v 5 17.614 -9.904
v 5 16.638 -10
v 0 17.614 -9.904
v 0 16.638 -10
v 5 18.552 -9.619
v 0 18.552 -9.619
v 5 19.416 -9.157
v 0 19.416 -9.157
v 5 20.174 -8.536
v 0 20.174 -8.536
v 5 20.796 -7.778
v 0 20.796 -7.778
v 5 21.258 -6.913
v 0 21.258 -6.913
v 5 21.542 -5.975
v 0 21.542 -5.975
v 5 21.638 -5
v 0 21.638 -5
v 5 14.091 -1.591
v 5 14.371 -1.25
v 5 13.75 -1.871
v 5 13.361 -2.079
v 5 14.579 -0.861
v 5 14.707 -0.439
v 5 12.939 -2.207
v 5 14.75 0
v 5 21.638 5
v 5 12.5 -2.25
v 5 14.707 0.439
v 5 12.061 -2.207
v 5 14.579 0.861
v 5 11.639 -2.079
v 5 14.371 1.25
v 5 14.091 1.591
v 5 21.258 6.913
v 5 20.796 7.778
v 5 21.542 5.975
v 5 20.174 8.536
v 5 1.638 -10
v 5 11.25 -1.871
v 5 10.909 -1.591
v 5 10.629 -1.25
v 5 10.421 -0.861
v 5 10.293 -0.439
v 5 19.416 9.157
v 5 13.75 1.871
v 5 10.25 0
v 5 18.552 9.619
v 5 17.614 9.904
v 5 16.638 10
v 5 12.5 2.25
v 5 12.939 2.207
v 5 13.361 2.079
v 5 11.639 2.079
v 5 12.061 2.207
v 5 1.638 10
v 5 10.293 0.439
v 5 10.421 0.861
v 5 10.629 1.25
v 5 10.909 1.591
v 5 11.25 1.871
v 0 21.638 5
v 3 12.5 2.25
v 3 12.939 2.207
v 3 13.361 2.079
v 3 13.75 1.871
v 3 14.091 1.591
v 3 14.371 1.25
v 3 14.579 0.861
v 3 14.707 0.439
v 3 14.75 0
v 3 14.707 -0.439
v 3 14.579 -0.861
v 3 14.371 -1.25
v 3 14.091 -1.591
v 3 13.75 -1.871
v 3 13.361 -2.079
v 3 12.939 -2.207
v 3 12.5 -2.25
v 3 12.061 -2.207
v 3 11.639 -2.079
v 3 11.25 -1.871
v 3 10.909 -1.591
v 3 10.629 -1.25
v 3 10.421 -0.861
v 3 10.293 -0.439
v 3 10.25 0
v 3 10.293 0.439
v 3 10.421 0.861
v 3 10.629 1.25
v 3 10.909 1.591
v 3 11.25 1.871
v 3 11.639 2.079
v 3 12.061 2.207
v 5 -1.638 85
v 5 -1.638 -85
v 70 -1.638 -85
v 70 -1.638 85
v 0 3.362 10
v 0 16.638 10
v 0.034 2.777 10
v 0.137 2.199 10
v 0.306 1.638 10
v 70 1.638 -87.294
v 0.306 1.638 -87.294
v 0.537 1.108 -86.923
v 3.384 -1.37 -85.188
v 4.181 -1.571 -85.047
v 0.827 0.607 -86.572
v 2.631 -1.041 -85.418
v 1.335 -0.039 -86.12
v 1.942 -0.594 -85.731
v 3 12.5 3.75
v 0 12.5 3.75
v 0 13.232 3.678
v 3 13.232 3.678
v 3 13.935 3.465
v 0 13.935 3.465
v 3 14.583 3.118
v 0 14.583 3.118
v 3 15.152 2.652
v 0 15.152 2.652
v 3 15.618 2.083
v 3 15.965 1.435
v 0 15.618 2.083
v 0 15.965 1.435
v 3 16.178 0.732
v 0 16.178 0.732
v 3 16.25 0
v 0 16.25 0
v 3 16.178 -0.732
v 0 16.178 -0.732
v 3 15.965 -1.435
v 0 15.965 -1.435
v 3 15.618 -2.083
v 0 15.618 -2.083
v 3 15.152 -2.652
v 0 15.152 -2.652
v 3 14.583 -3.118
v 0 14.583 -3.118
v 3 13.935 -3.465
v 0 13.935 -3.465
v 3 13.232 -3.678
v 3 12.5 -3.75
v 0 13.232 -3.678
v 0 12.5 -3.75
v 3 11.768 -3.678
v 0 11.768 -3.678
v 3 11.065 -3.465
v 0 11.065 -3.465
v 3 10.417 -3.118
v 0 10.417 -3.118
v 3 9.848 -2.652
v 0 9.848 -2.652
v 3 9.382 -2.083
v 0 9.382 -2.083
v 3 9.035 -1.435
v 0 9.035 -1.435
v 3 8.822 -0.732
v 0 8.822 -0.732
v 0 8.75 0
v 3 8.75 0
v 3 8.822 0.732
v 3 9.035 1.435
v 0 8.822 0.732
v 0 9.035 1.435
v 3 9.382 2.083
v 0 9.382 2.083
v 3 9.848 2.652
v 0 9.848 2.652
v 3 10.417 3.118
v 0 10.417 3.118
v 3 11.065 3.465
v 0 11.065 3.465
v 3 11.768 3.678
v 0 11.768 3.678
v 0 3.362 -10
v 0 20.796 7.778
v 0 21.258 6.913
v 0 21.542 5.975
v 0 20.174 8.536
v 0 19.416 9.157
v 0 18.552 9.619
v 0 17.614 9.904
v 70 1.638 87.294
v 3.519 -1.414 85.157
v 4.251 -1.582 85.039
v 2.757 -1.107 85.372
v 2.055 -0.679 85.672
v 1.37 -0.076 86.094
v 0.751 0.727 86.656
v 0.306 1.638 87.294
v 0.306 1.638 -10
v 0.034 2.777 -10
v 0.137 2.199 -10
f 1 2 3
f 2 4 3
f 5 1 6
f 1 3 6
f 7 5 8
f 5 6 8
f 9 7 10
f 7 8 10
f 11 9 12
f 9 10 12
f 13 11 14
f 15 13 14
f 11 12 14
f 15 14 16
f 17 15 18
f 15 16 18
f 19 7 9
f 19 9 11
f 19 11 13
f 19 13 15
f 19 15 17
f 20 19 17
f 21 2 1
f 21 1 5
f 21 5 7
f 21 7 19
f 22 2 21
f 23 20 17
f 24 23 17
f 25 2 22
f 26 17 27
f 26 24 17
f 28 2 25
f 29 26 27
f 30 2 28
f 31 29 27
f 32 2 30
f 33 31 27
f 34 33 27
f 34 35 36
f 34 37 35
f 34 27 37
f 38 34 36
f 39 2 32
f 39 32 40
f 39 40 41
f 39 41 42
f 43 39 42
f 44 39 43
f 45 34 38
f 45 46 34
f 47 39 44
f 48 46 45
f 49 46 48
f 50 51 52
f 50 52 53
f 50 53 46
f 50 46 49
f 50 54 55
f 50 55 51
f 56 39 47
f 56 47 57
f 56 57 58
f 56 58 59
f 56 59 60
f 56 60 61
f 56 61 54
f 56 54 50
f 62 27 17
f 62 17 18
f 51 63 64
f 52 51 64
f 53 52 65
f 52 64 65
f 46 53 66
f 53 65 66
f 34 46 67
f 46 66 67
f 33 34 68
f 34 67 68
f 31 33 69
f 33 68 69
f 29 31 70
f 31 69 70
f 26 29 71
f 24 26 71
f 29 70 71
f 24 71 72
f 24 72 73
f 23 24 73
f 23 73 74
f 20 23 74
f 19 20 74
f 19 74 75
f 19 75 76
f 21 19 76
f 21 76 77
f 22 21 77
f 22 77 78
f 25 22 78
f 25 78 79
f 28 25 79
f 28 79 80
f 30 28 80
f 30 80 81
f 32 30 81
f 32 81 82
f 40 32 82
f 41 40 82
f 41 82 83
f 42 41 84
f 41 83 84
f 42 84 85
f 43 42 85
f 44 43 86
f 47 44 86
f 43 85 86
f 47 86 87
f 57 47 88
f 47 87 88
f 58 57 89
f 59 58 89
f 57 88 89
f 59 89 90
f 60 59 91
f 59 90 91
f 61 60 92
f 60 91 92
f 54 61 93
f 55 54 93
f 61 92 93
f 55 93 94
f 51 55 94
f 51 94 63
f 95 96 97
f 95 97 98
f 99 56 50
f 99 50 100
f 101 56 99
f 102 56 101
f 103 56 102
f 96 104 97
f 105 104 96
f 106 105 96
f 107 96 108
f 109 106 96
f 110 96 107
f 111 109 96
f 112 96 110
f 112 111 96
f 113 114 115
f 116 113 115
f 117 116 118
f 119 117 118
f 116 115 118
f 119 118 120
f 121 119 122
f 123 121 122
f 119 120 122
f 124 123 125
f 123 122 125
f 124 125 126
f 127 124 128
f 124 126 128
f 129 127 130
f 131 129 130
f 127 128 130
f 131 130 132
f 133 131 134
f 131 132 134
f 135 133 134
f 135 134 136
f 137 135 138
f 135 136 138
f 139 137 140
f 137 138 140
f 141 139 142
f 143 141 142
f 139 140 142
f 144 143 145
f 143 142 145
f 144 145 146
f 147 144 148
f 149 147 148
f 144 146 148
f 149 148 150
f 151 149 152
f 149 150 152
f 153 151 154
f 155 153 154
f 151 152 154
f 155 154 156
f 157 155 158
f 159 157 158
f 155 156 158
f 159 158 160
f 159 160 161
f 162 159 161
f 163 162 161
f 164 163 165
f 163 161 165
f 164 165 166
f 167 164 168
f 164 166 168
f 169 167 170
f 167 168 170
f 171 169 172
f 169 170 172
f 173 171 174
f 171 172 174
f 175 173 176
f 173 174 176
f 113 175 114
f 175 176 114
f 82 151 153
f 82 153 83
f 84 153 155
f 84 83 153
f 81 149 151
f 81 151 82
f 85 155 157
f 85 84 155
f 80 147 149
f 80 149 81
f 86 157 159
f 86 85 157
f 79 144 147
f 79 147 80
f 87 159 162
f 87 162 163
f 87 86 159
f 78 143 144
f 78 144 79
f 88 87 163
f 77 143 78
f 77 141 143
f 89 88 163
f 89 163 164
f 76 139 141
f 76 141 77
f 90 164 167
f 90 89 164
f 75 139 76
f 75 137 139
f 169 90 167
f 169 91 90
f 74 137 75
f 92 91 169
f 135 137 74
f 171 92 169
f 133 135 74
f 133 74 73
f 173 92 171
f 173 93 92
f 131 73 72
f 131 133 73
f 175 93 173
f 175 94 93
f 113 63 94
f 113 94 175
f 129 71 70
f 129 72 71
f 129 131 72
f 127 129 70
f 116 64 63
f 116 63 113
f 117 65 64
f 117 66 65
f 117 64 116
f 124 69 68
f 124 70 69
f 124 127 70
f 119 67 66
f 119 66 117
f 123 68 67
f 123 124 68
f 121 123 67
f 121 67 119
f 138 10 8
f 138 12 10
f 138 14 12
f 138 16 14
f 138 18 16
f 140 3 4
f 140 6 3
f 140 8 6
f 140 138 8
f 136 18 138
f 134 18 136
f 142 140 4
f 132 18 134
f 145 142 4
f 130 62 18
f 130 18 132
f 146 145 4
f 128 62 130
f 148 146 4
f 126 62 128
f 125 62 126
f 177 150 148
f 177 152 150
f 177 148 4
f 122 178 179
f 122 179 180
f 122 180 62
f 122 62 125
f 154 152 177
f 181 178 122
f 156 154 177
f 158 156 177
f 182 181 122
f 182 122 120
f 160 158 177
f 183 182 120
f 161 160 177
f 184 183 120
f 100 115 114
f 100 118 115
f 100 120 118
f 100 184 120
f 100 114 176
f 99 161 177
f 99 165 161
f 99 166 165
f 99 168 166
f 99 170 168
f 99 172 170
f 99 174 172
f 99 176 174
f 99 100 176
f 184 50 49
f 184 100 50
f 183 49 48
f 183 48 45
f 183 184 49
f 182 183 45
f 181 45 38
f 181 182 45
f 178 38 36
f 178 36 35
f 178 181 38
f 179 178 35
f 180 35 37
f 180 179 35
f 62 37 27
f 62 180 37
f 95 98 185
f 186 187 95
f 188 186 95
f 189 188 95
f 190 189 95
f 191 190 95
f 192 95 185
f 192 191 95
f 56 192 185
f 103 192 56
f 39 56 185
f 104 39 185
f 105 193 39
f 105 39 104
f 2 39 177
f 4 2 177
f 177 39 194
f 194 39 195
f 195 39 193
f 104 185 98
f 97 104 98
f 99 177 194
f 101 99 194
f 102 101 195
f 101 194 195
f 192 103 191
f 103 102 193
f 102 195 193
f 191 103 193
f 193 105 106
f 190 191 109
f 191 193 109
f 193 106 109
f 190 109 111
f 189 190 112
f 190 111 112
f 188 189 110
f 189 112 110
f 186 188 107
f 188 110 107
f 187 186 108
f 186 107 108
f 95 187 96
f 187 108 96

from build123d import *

# Parameters (mm, degrees)
BOSS_EXTRUDE1_DEPTH     = 70
SKETCH4_W               = 5
SKETCH4_H               = 20
BOSS_EXTRUDE2_DEPTH     = 20
CUT_EXTRUDE2_DEPTH      = 114.967153248
CUT_EXTRUDE2_DEPTH_BACK = 114.967153248
CUT_EXTRUDE3_REACH      = 115.967
SKETCH6_R               = 2.25
SKETCH7_R               = 3.75
CUT_EXTRUDE4_DEPTH      = 3
FILLET1_R               = 5


with BuildPart() as part:
    # Sketch1 → Boss-Extrude1 (new body)
    with BuildSketch(Plane.YZ):
        Polygon((-1.638304089, 85), (1.638304089, 87.294305745), (1.638304089, -87.294305745), (-1.638304089, -85), align=None)
    extrude(amount=BOSS_EXTRUDE1_DEPTH)

    # Sketch4 → Boss-Extrude2 (add)
    with BuildSketch(Plane(origin=(0, 1.638304089, 0), x_dir=(-1, 0, 0), z_dir=(0, 1, 0))):
        with Locations((-2.5, 0)):
            Rectangle(SKETCH4_W, SKETCH4_H)
    extrude(amount=BOSS_EXTRUDE2_DEPTH)

    # Sketch5 → Cut-Extrude2 (cut, two sides: drawn at the far end of the back side and taken through both)
    with BuildSketch(Plane(origin=(0, 0, 0), x_dir=(0, 1, 0), z_dir=(0, 0, 1)).offset(-CUT_EXTRUDE2_DEPTH_BACK)):
        with BuildLine():
            ThreePointArc((3.361695911, 0), (-0.173837995, -1.464466094), (-1.638304089, -5))
            Line((-1.638304089, -5), (-1.638304089, 0))
            Line((-1.638304089, 0), (3.361695911, 0))
        make_face()
    extrude(amount=CUT_EXTRUDE2_DEPTH + CUT_EXTRUDE2_DEPTH_BACK, mode=Mode.SUBTRACT)

    # Sketch6 → Cut-Extrude3 (cut, up to next)
    with BuildSketch(Plane(origin=(0, 0, 0), x_dir=(0, -1, 0), z_dir=(-1, 0, 0)), mode=Mode.PRIVATE) as cut_extrude3_sk1:
        with Locations(Location((-12.5, 0, 0), (0, 0, 90))):
            Circle(SKETCH6_R)
    cut_extrude3_tool1 = extrude(cut_extrude3_sk1.sketch, amount=-CUT_EXTRUDE3_REACH, mode=Mode.PRIVATE) & part.part
    add(cut_extrude3_tool1.solids().sort_by_distance((0, 12.5, 0))[0], mode=Mode.SUBTRACT)

    # Sketch7 → Cut-Extrude4 (cut)
    with BuildSketch(Plane(origin=(0, 0, 0), x_dir=(0, -1, 0), z_dir=(-1, 0, 0))):
        with Locations(Location((-12.5, 0, 0), (0, 0, 90))):
            Circle(SKETCH7_R)
    extrude(amount=-CUT_EXTRUDE4_DEPTH, mode=Mode.SUBTRACT)

    # Fillet1
    fillet1_edges = [part.edges().sort_by_distance(p)[0] for p in [
        (2.5, 21.638304089, -10),
        (2.5, 21.638304089, 10),
    ]]
    fillet(fillet1_edges, radius=FILLET1_R)


solid = part.part
